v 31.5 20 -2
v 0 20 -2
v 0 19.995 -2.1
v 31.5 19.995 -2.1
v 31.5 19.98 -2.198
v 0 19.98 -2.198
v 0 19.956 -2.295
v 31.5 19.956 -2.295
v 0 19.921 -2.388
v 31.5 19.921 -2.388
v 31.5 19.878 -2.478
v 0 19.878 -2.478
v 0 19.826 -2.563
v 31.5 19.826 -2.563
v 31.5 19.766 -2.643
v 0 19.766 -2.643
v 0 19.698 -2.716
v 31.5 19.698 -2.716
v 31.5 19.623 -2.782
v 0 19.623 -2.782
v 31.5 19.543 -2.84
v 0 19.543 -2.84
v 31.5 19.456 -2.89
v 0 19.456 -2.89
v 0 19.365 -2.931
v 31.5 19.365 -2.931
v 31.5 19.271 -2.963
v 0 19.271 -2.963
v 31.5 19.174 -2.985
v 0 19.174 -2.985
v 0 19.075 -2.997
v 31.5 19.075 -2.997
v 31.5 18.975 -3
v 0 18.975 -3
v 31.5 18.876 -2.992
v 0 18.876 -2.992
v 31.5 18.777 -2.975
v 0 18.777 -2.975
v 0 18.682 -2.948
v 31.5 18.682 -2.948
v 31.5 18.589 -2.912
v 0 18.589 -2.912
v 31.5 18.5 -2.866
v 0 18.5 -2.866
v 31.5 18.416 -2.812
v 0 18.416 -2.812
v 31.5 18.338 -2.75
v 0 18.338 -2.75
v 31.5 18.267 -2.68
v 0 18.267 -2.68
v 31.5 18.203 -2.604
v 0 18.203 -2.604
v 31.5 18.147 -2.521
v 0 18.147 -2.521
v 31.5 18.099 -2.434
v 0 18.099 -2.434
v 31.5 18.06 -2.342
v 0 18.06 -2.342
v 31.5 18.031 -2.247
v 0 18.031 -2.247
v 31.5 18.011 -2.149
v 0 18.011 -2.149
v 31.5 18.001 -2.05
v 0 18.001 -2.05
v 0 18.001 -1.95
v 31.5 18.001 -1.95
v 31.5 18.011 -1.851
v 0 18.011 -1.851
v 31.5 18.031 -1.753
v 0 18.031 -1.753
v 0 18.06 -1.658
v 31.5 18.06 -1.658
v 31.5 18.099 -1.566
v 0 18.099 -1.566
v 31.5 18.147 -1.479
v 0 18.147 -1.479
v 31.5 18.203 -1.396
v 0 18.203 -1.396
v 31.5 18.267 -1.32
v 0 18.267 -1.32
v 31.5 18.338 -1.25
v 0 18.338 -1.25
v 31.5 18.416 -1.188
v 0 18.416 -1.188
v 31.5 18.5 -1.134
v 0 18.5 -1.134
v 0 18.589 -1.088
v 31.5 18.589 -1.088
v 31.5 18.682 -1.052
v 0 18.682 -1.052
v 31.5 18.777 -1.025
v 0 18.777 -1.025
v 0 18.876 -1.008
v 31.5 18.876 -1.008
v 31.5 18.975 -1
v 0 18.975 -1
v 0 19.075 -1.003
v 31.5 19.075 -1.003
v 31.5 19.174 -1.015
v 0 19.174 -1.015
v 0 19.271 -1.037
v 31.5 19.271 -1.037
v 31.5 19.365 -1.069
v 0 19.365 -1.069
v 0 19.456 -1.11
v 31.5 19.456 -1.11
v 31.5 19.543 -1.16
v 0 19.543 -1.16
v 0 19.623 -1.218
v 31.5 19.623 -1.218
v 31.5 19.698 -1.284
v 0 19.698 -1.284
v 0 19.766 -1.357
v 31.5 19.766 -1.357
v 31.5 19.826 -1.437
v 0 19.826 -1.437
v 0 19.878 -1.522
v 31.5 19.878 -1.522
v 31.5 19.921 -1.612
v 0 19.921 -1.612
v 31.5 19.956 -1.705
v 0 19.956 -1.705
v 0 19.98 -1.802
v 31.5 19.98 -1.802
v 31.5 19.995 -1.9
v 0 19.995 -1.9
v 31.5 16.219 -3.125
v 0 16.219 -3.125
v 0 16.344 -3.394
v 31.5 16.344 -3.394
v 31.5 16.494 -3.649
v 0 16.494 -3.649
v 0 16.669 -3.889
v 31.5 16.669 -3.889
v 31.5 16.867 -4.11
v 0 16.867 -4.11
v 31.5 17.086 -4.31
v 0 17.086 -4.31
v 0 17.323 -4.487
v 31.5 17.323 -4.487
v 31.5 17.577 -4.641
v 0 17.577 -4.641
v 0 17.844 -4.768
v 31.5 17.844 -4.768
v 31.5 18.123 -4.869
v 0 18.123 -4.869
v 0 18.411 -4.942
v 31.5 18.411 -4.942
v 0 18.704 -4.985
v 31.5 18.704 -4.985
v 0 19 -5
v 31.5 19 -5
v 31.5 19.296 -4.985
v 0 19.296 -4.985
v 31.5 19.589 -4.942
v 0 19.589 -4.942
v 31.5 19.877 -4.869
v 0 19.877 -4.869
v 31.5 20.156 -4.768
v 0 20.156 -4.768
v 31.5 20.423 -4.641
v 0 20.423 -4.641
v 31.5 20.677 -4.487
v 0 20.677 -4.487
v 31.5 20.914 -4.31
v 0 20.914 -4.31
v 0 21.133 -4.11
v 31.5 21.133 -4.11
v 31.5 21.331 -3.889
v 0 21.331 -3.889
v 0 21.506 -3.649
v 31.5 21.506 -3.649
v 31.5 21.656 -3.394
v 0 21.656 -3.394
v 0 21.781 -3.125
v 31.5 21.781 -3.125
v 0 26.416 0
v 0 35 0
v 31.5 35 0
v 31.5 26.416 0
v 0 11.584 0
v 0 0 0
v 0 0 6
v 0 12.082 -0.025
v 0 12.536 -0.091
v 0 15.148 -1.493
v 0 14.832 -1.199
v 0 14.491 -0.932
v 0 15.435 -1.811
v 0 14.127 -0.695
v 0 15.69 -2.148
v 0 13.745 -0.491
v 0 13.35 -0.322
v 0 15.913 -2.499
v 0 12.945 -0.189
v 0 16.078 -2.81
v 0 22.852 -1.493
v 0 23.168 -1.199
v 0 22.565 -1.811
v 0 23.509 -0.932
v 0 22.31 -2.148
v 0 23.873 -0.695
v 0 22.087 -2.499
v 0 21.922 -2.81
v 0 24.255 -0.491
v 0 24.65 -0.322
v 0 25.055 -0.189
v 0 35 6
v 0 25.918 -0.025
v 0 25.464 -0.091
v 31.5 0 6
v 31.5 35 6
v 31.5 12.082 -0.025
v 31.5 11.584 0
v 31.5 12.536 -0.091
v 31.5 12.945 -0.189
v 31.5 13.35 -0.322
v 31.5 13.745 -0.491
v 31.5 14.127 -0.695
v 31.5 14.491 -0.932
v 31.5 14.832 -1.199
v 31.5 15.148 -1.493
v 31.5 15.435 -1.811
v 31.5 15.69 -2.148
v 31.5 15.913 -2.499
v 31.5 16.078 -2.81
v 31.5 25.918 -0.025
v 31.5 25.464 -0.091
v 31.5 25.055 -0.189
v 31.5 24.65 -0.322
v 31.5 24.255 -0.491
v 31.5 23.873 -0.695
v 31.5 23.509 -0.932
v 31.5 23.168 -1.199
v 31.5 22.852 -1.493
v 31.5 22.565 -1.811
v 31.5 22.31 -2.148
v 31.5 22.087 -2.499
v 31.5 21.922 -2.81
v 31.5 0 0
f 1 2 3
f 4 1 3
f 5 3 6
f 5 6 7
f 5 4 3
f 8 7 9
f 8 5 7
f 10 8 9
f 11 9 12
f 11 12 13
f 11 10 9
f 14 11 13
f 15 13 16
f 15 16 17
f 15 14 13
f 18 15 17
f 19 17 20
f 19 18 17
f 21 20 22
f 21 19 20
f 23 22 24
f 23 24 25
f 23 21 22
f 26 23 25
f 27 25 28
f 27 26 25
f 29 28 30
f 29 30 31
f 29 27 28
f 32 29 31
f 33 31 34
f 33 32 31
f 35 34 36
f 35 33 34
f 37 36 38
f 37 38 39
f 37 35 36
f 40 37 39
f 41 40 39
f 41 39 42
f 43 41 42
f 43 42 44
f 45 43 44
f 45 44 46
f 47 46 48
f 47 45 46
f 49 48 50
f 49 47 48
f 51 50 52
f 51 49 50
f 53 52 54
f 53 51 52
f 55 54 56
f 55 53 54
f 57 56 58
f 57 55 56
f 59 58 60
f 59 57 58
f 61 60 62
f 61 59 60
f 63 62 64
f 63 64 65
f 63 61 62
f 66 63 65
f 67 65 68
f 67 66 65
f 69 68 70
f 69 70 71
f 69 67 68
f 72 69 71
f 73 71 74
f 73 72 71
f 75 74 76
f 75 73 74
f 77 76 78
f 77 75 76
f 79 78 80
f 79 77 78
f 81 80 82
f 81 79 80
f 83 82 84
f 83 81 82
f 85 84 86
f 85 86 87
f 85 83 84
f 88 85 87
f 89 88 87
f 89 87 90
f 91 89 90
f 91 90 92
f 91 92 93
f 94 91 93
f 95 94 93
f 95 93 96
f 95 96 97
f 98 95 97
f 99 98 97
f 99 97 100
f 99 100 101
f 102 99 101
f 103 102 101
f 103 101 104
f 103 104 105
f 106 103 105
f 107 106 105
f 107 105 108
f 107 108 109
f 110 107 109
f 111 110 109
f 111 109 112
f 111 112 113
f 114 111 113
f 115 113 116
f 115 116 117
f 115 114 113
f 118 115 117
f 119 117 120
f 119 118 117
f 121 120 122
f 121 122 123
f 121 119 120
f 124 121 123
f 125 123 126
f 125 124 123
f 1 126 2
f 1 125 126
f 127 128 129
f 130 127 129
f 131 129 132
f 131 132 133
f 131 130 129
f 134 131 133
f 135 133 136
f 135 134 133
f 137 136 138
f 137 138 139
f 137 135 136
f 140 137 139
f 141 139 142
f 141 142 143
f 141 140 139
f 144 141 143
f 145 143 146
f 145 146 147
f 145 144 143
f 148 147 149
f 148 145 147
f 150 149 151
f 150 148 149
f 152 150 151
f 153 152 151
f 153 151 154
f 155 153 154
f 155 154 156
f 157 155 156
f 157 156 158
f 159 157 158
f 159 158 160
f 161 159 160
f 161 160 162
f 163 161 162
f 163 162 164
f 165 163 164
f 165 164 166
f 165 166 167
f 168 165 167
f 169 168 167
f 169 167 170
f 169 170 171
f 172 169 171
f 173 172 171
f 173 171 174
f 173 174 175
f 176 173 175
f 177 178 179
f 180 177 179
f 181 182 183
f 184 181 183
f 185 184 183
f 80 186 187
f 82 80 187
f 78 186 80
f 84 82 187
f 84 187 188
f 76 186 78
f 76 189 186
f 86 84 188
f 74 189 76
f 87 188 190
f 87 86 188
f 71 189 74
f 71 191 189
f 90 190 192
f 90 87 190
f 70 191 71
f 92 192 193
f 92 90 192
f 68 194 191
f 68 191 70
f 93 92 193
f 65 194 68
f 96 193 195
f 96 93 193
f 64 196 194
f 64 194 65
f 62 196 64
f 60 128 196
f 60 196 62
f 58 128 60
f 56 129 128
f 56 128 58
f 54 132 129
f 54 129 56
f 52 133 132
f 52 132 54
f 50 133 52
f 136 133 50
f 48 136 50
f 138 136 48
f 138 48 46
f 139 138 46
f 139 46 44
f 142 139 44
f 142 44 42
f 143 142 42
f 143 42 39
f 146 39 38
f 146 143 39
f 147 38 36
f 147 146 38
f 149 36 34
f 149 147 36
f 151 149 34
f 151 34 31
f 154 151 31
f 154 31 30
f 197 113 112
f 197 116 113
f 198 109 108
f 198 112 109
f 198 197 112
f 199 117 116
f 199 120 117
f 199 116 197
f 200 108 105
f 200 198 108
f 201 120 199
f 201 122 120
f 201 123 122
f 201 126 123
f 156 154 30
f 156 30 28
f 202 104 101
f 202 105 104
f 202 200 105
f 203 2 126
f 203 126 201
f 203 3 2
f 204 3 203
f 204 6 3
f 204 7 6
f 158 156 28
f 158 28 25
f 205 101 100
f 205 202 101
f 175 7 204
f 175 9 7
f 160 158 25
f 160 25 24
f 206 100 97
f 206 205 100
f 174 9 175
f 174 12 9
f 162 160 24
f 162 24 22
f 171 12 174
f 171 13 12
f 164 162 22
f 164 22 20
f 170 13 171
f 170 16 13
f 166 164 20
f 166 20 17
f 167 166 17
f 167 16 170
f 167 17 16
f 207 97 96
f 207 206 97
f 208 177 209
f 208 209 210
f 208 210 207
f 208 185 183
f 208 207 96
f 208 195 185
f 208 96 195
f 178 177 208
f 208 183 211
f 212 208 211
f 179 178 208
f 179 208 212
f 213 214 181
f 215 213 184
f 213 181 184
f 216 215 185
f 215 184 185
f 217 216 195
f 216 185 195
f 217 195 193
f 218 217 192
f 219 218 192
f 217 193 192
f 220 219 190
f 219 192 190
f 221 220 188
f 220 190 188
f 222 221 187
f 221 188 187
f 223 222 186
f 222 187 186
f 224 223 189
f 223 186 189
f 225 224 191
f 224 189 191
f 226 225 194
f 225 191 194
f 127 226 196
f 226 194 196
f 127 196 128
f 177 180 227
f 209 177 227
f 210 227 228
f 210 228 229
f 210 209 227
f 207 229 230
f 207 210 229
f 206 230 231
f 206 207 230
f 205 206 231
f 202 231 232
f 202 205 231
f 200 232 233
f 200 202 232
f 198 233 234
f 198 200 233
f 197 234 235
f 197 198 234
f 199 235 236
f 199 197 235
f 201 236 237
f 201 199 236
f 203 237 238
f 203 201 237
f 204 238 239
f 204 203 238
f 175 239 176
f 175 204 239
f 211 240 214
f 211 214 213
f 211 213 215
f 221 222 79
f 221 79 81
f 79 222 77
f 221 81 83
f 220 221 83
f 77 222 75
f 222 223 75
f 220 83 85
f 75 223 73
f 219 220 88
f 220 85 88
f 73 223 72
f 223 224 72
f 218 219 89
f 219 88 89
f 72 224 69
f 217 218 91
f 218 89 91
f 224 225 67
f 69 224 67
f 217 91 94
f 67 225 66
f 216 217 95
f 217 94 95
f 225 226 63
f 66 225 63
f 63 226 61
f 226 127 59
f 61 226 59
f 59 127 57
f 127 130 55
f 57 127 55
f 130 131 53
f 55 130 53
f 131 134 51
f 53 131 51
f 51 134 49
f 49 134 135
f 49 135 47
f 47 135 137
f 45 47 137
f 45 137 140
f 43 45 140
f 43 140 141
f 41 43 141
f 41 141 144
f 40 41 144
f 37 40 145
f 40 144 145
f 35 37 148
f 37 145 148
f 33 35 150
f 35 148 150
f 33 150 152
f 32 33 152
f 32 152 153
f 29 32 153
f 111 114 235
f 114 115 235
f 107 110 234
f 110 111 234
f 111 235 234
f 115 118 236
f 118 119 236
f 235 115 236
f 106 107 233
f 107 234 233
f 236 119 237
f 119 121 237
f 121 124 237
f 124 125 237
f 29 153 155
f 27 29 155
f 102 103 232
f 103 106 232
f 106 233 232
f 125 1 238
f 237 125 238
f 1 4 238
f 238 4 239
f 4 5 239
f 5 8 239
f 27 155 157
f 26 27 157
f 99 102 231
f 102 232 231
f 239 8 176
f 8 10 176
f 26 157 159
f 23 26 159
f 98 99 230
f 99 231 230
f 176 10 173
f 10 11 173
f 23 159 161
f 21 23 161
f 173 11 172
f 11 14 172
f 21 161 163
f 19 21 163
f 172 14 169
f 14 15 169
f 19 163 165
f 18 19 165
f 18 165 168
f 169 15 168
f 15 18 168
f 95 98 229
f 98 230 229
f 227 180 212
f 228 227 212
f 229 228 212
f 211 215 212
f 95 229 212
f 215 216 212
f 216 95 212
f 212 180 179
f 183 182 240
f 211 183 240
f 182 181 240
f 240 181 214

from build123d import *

# Parameters (mm, degrees)
F0_W     = 31.5
F0_H     = 35
F1_DEPTH = 6
F3_DEPTH = 31.5
F4_R     = 5


# Not quite as in the source:
# - a feature of the source that left no trace in its solid (it failed there, or was rolled back) is left out


with BuildPart() as f1:
    # F0 (on Top) → F1 (new body)
    with BuildSketch(Plane.XY):
        with Locations((15.75, 17.5)):
            Rectangle(F0_W, F0_H)
    extrude(amount=F1_DEPTH)

    # F2 (on face) → F3 (join, through all)
    with BuildSketch(Plane.YZ.offset(31.5)):
        with BuildLine():
            Line((22, -2), (22, 0))
            Line((22, 0), (16, 0))
            Line((16, 0), (16, -2))
            Line((16, -2), (18, -2))
            ThreePointArc((18, -2), (19, -1), (20, -2))
            Line((20, -2), (22, -2))
        make_face()
        with BuildLine():
            ThreePointArc((16, -2), (19, -5), (22, -2))
            Line((22, -2), (20, -2))
            ThreePointArc((20, -2), (19, -3), (18, -2))
            Line((18, -2), (16, -2))
        make_face()
    extrude(amount=-F3_DEPTH)

    # F4
    f4_edges = [f1.edges().sort_by_distance(p)[0] for p in [
        (15.75, 22, 0),
        (15.75, 16, 0),
    ]]
    fillet(f4_edges, radius=F4_R)


solid = f1.part
